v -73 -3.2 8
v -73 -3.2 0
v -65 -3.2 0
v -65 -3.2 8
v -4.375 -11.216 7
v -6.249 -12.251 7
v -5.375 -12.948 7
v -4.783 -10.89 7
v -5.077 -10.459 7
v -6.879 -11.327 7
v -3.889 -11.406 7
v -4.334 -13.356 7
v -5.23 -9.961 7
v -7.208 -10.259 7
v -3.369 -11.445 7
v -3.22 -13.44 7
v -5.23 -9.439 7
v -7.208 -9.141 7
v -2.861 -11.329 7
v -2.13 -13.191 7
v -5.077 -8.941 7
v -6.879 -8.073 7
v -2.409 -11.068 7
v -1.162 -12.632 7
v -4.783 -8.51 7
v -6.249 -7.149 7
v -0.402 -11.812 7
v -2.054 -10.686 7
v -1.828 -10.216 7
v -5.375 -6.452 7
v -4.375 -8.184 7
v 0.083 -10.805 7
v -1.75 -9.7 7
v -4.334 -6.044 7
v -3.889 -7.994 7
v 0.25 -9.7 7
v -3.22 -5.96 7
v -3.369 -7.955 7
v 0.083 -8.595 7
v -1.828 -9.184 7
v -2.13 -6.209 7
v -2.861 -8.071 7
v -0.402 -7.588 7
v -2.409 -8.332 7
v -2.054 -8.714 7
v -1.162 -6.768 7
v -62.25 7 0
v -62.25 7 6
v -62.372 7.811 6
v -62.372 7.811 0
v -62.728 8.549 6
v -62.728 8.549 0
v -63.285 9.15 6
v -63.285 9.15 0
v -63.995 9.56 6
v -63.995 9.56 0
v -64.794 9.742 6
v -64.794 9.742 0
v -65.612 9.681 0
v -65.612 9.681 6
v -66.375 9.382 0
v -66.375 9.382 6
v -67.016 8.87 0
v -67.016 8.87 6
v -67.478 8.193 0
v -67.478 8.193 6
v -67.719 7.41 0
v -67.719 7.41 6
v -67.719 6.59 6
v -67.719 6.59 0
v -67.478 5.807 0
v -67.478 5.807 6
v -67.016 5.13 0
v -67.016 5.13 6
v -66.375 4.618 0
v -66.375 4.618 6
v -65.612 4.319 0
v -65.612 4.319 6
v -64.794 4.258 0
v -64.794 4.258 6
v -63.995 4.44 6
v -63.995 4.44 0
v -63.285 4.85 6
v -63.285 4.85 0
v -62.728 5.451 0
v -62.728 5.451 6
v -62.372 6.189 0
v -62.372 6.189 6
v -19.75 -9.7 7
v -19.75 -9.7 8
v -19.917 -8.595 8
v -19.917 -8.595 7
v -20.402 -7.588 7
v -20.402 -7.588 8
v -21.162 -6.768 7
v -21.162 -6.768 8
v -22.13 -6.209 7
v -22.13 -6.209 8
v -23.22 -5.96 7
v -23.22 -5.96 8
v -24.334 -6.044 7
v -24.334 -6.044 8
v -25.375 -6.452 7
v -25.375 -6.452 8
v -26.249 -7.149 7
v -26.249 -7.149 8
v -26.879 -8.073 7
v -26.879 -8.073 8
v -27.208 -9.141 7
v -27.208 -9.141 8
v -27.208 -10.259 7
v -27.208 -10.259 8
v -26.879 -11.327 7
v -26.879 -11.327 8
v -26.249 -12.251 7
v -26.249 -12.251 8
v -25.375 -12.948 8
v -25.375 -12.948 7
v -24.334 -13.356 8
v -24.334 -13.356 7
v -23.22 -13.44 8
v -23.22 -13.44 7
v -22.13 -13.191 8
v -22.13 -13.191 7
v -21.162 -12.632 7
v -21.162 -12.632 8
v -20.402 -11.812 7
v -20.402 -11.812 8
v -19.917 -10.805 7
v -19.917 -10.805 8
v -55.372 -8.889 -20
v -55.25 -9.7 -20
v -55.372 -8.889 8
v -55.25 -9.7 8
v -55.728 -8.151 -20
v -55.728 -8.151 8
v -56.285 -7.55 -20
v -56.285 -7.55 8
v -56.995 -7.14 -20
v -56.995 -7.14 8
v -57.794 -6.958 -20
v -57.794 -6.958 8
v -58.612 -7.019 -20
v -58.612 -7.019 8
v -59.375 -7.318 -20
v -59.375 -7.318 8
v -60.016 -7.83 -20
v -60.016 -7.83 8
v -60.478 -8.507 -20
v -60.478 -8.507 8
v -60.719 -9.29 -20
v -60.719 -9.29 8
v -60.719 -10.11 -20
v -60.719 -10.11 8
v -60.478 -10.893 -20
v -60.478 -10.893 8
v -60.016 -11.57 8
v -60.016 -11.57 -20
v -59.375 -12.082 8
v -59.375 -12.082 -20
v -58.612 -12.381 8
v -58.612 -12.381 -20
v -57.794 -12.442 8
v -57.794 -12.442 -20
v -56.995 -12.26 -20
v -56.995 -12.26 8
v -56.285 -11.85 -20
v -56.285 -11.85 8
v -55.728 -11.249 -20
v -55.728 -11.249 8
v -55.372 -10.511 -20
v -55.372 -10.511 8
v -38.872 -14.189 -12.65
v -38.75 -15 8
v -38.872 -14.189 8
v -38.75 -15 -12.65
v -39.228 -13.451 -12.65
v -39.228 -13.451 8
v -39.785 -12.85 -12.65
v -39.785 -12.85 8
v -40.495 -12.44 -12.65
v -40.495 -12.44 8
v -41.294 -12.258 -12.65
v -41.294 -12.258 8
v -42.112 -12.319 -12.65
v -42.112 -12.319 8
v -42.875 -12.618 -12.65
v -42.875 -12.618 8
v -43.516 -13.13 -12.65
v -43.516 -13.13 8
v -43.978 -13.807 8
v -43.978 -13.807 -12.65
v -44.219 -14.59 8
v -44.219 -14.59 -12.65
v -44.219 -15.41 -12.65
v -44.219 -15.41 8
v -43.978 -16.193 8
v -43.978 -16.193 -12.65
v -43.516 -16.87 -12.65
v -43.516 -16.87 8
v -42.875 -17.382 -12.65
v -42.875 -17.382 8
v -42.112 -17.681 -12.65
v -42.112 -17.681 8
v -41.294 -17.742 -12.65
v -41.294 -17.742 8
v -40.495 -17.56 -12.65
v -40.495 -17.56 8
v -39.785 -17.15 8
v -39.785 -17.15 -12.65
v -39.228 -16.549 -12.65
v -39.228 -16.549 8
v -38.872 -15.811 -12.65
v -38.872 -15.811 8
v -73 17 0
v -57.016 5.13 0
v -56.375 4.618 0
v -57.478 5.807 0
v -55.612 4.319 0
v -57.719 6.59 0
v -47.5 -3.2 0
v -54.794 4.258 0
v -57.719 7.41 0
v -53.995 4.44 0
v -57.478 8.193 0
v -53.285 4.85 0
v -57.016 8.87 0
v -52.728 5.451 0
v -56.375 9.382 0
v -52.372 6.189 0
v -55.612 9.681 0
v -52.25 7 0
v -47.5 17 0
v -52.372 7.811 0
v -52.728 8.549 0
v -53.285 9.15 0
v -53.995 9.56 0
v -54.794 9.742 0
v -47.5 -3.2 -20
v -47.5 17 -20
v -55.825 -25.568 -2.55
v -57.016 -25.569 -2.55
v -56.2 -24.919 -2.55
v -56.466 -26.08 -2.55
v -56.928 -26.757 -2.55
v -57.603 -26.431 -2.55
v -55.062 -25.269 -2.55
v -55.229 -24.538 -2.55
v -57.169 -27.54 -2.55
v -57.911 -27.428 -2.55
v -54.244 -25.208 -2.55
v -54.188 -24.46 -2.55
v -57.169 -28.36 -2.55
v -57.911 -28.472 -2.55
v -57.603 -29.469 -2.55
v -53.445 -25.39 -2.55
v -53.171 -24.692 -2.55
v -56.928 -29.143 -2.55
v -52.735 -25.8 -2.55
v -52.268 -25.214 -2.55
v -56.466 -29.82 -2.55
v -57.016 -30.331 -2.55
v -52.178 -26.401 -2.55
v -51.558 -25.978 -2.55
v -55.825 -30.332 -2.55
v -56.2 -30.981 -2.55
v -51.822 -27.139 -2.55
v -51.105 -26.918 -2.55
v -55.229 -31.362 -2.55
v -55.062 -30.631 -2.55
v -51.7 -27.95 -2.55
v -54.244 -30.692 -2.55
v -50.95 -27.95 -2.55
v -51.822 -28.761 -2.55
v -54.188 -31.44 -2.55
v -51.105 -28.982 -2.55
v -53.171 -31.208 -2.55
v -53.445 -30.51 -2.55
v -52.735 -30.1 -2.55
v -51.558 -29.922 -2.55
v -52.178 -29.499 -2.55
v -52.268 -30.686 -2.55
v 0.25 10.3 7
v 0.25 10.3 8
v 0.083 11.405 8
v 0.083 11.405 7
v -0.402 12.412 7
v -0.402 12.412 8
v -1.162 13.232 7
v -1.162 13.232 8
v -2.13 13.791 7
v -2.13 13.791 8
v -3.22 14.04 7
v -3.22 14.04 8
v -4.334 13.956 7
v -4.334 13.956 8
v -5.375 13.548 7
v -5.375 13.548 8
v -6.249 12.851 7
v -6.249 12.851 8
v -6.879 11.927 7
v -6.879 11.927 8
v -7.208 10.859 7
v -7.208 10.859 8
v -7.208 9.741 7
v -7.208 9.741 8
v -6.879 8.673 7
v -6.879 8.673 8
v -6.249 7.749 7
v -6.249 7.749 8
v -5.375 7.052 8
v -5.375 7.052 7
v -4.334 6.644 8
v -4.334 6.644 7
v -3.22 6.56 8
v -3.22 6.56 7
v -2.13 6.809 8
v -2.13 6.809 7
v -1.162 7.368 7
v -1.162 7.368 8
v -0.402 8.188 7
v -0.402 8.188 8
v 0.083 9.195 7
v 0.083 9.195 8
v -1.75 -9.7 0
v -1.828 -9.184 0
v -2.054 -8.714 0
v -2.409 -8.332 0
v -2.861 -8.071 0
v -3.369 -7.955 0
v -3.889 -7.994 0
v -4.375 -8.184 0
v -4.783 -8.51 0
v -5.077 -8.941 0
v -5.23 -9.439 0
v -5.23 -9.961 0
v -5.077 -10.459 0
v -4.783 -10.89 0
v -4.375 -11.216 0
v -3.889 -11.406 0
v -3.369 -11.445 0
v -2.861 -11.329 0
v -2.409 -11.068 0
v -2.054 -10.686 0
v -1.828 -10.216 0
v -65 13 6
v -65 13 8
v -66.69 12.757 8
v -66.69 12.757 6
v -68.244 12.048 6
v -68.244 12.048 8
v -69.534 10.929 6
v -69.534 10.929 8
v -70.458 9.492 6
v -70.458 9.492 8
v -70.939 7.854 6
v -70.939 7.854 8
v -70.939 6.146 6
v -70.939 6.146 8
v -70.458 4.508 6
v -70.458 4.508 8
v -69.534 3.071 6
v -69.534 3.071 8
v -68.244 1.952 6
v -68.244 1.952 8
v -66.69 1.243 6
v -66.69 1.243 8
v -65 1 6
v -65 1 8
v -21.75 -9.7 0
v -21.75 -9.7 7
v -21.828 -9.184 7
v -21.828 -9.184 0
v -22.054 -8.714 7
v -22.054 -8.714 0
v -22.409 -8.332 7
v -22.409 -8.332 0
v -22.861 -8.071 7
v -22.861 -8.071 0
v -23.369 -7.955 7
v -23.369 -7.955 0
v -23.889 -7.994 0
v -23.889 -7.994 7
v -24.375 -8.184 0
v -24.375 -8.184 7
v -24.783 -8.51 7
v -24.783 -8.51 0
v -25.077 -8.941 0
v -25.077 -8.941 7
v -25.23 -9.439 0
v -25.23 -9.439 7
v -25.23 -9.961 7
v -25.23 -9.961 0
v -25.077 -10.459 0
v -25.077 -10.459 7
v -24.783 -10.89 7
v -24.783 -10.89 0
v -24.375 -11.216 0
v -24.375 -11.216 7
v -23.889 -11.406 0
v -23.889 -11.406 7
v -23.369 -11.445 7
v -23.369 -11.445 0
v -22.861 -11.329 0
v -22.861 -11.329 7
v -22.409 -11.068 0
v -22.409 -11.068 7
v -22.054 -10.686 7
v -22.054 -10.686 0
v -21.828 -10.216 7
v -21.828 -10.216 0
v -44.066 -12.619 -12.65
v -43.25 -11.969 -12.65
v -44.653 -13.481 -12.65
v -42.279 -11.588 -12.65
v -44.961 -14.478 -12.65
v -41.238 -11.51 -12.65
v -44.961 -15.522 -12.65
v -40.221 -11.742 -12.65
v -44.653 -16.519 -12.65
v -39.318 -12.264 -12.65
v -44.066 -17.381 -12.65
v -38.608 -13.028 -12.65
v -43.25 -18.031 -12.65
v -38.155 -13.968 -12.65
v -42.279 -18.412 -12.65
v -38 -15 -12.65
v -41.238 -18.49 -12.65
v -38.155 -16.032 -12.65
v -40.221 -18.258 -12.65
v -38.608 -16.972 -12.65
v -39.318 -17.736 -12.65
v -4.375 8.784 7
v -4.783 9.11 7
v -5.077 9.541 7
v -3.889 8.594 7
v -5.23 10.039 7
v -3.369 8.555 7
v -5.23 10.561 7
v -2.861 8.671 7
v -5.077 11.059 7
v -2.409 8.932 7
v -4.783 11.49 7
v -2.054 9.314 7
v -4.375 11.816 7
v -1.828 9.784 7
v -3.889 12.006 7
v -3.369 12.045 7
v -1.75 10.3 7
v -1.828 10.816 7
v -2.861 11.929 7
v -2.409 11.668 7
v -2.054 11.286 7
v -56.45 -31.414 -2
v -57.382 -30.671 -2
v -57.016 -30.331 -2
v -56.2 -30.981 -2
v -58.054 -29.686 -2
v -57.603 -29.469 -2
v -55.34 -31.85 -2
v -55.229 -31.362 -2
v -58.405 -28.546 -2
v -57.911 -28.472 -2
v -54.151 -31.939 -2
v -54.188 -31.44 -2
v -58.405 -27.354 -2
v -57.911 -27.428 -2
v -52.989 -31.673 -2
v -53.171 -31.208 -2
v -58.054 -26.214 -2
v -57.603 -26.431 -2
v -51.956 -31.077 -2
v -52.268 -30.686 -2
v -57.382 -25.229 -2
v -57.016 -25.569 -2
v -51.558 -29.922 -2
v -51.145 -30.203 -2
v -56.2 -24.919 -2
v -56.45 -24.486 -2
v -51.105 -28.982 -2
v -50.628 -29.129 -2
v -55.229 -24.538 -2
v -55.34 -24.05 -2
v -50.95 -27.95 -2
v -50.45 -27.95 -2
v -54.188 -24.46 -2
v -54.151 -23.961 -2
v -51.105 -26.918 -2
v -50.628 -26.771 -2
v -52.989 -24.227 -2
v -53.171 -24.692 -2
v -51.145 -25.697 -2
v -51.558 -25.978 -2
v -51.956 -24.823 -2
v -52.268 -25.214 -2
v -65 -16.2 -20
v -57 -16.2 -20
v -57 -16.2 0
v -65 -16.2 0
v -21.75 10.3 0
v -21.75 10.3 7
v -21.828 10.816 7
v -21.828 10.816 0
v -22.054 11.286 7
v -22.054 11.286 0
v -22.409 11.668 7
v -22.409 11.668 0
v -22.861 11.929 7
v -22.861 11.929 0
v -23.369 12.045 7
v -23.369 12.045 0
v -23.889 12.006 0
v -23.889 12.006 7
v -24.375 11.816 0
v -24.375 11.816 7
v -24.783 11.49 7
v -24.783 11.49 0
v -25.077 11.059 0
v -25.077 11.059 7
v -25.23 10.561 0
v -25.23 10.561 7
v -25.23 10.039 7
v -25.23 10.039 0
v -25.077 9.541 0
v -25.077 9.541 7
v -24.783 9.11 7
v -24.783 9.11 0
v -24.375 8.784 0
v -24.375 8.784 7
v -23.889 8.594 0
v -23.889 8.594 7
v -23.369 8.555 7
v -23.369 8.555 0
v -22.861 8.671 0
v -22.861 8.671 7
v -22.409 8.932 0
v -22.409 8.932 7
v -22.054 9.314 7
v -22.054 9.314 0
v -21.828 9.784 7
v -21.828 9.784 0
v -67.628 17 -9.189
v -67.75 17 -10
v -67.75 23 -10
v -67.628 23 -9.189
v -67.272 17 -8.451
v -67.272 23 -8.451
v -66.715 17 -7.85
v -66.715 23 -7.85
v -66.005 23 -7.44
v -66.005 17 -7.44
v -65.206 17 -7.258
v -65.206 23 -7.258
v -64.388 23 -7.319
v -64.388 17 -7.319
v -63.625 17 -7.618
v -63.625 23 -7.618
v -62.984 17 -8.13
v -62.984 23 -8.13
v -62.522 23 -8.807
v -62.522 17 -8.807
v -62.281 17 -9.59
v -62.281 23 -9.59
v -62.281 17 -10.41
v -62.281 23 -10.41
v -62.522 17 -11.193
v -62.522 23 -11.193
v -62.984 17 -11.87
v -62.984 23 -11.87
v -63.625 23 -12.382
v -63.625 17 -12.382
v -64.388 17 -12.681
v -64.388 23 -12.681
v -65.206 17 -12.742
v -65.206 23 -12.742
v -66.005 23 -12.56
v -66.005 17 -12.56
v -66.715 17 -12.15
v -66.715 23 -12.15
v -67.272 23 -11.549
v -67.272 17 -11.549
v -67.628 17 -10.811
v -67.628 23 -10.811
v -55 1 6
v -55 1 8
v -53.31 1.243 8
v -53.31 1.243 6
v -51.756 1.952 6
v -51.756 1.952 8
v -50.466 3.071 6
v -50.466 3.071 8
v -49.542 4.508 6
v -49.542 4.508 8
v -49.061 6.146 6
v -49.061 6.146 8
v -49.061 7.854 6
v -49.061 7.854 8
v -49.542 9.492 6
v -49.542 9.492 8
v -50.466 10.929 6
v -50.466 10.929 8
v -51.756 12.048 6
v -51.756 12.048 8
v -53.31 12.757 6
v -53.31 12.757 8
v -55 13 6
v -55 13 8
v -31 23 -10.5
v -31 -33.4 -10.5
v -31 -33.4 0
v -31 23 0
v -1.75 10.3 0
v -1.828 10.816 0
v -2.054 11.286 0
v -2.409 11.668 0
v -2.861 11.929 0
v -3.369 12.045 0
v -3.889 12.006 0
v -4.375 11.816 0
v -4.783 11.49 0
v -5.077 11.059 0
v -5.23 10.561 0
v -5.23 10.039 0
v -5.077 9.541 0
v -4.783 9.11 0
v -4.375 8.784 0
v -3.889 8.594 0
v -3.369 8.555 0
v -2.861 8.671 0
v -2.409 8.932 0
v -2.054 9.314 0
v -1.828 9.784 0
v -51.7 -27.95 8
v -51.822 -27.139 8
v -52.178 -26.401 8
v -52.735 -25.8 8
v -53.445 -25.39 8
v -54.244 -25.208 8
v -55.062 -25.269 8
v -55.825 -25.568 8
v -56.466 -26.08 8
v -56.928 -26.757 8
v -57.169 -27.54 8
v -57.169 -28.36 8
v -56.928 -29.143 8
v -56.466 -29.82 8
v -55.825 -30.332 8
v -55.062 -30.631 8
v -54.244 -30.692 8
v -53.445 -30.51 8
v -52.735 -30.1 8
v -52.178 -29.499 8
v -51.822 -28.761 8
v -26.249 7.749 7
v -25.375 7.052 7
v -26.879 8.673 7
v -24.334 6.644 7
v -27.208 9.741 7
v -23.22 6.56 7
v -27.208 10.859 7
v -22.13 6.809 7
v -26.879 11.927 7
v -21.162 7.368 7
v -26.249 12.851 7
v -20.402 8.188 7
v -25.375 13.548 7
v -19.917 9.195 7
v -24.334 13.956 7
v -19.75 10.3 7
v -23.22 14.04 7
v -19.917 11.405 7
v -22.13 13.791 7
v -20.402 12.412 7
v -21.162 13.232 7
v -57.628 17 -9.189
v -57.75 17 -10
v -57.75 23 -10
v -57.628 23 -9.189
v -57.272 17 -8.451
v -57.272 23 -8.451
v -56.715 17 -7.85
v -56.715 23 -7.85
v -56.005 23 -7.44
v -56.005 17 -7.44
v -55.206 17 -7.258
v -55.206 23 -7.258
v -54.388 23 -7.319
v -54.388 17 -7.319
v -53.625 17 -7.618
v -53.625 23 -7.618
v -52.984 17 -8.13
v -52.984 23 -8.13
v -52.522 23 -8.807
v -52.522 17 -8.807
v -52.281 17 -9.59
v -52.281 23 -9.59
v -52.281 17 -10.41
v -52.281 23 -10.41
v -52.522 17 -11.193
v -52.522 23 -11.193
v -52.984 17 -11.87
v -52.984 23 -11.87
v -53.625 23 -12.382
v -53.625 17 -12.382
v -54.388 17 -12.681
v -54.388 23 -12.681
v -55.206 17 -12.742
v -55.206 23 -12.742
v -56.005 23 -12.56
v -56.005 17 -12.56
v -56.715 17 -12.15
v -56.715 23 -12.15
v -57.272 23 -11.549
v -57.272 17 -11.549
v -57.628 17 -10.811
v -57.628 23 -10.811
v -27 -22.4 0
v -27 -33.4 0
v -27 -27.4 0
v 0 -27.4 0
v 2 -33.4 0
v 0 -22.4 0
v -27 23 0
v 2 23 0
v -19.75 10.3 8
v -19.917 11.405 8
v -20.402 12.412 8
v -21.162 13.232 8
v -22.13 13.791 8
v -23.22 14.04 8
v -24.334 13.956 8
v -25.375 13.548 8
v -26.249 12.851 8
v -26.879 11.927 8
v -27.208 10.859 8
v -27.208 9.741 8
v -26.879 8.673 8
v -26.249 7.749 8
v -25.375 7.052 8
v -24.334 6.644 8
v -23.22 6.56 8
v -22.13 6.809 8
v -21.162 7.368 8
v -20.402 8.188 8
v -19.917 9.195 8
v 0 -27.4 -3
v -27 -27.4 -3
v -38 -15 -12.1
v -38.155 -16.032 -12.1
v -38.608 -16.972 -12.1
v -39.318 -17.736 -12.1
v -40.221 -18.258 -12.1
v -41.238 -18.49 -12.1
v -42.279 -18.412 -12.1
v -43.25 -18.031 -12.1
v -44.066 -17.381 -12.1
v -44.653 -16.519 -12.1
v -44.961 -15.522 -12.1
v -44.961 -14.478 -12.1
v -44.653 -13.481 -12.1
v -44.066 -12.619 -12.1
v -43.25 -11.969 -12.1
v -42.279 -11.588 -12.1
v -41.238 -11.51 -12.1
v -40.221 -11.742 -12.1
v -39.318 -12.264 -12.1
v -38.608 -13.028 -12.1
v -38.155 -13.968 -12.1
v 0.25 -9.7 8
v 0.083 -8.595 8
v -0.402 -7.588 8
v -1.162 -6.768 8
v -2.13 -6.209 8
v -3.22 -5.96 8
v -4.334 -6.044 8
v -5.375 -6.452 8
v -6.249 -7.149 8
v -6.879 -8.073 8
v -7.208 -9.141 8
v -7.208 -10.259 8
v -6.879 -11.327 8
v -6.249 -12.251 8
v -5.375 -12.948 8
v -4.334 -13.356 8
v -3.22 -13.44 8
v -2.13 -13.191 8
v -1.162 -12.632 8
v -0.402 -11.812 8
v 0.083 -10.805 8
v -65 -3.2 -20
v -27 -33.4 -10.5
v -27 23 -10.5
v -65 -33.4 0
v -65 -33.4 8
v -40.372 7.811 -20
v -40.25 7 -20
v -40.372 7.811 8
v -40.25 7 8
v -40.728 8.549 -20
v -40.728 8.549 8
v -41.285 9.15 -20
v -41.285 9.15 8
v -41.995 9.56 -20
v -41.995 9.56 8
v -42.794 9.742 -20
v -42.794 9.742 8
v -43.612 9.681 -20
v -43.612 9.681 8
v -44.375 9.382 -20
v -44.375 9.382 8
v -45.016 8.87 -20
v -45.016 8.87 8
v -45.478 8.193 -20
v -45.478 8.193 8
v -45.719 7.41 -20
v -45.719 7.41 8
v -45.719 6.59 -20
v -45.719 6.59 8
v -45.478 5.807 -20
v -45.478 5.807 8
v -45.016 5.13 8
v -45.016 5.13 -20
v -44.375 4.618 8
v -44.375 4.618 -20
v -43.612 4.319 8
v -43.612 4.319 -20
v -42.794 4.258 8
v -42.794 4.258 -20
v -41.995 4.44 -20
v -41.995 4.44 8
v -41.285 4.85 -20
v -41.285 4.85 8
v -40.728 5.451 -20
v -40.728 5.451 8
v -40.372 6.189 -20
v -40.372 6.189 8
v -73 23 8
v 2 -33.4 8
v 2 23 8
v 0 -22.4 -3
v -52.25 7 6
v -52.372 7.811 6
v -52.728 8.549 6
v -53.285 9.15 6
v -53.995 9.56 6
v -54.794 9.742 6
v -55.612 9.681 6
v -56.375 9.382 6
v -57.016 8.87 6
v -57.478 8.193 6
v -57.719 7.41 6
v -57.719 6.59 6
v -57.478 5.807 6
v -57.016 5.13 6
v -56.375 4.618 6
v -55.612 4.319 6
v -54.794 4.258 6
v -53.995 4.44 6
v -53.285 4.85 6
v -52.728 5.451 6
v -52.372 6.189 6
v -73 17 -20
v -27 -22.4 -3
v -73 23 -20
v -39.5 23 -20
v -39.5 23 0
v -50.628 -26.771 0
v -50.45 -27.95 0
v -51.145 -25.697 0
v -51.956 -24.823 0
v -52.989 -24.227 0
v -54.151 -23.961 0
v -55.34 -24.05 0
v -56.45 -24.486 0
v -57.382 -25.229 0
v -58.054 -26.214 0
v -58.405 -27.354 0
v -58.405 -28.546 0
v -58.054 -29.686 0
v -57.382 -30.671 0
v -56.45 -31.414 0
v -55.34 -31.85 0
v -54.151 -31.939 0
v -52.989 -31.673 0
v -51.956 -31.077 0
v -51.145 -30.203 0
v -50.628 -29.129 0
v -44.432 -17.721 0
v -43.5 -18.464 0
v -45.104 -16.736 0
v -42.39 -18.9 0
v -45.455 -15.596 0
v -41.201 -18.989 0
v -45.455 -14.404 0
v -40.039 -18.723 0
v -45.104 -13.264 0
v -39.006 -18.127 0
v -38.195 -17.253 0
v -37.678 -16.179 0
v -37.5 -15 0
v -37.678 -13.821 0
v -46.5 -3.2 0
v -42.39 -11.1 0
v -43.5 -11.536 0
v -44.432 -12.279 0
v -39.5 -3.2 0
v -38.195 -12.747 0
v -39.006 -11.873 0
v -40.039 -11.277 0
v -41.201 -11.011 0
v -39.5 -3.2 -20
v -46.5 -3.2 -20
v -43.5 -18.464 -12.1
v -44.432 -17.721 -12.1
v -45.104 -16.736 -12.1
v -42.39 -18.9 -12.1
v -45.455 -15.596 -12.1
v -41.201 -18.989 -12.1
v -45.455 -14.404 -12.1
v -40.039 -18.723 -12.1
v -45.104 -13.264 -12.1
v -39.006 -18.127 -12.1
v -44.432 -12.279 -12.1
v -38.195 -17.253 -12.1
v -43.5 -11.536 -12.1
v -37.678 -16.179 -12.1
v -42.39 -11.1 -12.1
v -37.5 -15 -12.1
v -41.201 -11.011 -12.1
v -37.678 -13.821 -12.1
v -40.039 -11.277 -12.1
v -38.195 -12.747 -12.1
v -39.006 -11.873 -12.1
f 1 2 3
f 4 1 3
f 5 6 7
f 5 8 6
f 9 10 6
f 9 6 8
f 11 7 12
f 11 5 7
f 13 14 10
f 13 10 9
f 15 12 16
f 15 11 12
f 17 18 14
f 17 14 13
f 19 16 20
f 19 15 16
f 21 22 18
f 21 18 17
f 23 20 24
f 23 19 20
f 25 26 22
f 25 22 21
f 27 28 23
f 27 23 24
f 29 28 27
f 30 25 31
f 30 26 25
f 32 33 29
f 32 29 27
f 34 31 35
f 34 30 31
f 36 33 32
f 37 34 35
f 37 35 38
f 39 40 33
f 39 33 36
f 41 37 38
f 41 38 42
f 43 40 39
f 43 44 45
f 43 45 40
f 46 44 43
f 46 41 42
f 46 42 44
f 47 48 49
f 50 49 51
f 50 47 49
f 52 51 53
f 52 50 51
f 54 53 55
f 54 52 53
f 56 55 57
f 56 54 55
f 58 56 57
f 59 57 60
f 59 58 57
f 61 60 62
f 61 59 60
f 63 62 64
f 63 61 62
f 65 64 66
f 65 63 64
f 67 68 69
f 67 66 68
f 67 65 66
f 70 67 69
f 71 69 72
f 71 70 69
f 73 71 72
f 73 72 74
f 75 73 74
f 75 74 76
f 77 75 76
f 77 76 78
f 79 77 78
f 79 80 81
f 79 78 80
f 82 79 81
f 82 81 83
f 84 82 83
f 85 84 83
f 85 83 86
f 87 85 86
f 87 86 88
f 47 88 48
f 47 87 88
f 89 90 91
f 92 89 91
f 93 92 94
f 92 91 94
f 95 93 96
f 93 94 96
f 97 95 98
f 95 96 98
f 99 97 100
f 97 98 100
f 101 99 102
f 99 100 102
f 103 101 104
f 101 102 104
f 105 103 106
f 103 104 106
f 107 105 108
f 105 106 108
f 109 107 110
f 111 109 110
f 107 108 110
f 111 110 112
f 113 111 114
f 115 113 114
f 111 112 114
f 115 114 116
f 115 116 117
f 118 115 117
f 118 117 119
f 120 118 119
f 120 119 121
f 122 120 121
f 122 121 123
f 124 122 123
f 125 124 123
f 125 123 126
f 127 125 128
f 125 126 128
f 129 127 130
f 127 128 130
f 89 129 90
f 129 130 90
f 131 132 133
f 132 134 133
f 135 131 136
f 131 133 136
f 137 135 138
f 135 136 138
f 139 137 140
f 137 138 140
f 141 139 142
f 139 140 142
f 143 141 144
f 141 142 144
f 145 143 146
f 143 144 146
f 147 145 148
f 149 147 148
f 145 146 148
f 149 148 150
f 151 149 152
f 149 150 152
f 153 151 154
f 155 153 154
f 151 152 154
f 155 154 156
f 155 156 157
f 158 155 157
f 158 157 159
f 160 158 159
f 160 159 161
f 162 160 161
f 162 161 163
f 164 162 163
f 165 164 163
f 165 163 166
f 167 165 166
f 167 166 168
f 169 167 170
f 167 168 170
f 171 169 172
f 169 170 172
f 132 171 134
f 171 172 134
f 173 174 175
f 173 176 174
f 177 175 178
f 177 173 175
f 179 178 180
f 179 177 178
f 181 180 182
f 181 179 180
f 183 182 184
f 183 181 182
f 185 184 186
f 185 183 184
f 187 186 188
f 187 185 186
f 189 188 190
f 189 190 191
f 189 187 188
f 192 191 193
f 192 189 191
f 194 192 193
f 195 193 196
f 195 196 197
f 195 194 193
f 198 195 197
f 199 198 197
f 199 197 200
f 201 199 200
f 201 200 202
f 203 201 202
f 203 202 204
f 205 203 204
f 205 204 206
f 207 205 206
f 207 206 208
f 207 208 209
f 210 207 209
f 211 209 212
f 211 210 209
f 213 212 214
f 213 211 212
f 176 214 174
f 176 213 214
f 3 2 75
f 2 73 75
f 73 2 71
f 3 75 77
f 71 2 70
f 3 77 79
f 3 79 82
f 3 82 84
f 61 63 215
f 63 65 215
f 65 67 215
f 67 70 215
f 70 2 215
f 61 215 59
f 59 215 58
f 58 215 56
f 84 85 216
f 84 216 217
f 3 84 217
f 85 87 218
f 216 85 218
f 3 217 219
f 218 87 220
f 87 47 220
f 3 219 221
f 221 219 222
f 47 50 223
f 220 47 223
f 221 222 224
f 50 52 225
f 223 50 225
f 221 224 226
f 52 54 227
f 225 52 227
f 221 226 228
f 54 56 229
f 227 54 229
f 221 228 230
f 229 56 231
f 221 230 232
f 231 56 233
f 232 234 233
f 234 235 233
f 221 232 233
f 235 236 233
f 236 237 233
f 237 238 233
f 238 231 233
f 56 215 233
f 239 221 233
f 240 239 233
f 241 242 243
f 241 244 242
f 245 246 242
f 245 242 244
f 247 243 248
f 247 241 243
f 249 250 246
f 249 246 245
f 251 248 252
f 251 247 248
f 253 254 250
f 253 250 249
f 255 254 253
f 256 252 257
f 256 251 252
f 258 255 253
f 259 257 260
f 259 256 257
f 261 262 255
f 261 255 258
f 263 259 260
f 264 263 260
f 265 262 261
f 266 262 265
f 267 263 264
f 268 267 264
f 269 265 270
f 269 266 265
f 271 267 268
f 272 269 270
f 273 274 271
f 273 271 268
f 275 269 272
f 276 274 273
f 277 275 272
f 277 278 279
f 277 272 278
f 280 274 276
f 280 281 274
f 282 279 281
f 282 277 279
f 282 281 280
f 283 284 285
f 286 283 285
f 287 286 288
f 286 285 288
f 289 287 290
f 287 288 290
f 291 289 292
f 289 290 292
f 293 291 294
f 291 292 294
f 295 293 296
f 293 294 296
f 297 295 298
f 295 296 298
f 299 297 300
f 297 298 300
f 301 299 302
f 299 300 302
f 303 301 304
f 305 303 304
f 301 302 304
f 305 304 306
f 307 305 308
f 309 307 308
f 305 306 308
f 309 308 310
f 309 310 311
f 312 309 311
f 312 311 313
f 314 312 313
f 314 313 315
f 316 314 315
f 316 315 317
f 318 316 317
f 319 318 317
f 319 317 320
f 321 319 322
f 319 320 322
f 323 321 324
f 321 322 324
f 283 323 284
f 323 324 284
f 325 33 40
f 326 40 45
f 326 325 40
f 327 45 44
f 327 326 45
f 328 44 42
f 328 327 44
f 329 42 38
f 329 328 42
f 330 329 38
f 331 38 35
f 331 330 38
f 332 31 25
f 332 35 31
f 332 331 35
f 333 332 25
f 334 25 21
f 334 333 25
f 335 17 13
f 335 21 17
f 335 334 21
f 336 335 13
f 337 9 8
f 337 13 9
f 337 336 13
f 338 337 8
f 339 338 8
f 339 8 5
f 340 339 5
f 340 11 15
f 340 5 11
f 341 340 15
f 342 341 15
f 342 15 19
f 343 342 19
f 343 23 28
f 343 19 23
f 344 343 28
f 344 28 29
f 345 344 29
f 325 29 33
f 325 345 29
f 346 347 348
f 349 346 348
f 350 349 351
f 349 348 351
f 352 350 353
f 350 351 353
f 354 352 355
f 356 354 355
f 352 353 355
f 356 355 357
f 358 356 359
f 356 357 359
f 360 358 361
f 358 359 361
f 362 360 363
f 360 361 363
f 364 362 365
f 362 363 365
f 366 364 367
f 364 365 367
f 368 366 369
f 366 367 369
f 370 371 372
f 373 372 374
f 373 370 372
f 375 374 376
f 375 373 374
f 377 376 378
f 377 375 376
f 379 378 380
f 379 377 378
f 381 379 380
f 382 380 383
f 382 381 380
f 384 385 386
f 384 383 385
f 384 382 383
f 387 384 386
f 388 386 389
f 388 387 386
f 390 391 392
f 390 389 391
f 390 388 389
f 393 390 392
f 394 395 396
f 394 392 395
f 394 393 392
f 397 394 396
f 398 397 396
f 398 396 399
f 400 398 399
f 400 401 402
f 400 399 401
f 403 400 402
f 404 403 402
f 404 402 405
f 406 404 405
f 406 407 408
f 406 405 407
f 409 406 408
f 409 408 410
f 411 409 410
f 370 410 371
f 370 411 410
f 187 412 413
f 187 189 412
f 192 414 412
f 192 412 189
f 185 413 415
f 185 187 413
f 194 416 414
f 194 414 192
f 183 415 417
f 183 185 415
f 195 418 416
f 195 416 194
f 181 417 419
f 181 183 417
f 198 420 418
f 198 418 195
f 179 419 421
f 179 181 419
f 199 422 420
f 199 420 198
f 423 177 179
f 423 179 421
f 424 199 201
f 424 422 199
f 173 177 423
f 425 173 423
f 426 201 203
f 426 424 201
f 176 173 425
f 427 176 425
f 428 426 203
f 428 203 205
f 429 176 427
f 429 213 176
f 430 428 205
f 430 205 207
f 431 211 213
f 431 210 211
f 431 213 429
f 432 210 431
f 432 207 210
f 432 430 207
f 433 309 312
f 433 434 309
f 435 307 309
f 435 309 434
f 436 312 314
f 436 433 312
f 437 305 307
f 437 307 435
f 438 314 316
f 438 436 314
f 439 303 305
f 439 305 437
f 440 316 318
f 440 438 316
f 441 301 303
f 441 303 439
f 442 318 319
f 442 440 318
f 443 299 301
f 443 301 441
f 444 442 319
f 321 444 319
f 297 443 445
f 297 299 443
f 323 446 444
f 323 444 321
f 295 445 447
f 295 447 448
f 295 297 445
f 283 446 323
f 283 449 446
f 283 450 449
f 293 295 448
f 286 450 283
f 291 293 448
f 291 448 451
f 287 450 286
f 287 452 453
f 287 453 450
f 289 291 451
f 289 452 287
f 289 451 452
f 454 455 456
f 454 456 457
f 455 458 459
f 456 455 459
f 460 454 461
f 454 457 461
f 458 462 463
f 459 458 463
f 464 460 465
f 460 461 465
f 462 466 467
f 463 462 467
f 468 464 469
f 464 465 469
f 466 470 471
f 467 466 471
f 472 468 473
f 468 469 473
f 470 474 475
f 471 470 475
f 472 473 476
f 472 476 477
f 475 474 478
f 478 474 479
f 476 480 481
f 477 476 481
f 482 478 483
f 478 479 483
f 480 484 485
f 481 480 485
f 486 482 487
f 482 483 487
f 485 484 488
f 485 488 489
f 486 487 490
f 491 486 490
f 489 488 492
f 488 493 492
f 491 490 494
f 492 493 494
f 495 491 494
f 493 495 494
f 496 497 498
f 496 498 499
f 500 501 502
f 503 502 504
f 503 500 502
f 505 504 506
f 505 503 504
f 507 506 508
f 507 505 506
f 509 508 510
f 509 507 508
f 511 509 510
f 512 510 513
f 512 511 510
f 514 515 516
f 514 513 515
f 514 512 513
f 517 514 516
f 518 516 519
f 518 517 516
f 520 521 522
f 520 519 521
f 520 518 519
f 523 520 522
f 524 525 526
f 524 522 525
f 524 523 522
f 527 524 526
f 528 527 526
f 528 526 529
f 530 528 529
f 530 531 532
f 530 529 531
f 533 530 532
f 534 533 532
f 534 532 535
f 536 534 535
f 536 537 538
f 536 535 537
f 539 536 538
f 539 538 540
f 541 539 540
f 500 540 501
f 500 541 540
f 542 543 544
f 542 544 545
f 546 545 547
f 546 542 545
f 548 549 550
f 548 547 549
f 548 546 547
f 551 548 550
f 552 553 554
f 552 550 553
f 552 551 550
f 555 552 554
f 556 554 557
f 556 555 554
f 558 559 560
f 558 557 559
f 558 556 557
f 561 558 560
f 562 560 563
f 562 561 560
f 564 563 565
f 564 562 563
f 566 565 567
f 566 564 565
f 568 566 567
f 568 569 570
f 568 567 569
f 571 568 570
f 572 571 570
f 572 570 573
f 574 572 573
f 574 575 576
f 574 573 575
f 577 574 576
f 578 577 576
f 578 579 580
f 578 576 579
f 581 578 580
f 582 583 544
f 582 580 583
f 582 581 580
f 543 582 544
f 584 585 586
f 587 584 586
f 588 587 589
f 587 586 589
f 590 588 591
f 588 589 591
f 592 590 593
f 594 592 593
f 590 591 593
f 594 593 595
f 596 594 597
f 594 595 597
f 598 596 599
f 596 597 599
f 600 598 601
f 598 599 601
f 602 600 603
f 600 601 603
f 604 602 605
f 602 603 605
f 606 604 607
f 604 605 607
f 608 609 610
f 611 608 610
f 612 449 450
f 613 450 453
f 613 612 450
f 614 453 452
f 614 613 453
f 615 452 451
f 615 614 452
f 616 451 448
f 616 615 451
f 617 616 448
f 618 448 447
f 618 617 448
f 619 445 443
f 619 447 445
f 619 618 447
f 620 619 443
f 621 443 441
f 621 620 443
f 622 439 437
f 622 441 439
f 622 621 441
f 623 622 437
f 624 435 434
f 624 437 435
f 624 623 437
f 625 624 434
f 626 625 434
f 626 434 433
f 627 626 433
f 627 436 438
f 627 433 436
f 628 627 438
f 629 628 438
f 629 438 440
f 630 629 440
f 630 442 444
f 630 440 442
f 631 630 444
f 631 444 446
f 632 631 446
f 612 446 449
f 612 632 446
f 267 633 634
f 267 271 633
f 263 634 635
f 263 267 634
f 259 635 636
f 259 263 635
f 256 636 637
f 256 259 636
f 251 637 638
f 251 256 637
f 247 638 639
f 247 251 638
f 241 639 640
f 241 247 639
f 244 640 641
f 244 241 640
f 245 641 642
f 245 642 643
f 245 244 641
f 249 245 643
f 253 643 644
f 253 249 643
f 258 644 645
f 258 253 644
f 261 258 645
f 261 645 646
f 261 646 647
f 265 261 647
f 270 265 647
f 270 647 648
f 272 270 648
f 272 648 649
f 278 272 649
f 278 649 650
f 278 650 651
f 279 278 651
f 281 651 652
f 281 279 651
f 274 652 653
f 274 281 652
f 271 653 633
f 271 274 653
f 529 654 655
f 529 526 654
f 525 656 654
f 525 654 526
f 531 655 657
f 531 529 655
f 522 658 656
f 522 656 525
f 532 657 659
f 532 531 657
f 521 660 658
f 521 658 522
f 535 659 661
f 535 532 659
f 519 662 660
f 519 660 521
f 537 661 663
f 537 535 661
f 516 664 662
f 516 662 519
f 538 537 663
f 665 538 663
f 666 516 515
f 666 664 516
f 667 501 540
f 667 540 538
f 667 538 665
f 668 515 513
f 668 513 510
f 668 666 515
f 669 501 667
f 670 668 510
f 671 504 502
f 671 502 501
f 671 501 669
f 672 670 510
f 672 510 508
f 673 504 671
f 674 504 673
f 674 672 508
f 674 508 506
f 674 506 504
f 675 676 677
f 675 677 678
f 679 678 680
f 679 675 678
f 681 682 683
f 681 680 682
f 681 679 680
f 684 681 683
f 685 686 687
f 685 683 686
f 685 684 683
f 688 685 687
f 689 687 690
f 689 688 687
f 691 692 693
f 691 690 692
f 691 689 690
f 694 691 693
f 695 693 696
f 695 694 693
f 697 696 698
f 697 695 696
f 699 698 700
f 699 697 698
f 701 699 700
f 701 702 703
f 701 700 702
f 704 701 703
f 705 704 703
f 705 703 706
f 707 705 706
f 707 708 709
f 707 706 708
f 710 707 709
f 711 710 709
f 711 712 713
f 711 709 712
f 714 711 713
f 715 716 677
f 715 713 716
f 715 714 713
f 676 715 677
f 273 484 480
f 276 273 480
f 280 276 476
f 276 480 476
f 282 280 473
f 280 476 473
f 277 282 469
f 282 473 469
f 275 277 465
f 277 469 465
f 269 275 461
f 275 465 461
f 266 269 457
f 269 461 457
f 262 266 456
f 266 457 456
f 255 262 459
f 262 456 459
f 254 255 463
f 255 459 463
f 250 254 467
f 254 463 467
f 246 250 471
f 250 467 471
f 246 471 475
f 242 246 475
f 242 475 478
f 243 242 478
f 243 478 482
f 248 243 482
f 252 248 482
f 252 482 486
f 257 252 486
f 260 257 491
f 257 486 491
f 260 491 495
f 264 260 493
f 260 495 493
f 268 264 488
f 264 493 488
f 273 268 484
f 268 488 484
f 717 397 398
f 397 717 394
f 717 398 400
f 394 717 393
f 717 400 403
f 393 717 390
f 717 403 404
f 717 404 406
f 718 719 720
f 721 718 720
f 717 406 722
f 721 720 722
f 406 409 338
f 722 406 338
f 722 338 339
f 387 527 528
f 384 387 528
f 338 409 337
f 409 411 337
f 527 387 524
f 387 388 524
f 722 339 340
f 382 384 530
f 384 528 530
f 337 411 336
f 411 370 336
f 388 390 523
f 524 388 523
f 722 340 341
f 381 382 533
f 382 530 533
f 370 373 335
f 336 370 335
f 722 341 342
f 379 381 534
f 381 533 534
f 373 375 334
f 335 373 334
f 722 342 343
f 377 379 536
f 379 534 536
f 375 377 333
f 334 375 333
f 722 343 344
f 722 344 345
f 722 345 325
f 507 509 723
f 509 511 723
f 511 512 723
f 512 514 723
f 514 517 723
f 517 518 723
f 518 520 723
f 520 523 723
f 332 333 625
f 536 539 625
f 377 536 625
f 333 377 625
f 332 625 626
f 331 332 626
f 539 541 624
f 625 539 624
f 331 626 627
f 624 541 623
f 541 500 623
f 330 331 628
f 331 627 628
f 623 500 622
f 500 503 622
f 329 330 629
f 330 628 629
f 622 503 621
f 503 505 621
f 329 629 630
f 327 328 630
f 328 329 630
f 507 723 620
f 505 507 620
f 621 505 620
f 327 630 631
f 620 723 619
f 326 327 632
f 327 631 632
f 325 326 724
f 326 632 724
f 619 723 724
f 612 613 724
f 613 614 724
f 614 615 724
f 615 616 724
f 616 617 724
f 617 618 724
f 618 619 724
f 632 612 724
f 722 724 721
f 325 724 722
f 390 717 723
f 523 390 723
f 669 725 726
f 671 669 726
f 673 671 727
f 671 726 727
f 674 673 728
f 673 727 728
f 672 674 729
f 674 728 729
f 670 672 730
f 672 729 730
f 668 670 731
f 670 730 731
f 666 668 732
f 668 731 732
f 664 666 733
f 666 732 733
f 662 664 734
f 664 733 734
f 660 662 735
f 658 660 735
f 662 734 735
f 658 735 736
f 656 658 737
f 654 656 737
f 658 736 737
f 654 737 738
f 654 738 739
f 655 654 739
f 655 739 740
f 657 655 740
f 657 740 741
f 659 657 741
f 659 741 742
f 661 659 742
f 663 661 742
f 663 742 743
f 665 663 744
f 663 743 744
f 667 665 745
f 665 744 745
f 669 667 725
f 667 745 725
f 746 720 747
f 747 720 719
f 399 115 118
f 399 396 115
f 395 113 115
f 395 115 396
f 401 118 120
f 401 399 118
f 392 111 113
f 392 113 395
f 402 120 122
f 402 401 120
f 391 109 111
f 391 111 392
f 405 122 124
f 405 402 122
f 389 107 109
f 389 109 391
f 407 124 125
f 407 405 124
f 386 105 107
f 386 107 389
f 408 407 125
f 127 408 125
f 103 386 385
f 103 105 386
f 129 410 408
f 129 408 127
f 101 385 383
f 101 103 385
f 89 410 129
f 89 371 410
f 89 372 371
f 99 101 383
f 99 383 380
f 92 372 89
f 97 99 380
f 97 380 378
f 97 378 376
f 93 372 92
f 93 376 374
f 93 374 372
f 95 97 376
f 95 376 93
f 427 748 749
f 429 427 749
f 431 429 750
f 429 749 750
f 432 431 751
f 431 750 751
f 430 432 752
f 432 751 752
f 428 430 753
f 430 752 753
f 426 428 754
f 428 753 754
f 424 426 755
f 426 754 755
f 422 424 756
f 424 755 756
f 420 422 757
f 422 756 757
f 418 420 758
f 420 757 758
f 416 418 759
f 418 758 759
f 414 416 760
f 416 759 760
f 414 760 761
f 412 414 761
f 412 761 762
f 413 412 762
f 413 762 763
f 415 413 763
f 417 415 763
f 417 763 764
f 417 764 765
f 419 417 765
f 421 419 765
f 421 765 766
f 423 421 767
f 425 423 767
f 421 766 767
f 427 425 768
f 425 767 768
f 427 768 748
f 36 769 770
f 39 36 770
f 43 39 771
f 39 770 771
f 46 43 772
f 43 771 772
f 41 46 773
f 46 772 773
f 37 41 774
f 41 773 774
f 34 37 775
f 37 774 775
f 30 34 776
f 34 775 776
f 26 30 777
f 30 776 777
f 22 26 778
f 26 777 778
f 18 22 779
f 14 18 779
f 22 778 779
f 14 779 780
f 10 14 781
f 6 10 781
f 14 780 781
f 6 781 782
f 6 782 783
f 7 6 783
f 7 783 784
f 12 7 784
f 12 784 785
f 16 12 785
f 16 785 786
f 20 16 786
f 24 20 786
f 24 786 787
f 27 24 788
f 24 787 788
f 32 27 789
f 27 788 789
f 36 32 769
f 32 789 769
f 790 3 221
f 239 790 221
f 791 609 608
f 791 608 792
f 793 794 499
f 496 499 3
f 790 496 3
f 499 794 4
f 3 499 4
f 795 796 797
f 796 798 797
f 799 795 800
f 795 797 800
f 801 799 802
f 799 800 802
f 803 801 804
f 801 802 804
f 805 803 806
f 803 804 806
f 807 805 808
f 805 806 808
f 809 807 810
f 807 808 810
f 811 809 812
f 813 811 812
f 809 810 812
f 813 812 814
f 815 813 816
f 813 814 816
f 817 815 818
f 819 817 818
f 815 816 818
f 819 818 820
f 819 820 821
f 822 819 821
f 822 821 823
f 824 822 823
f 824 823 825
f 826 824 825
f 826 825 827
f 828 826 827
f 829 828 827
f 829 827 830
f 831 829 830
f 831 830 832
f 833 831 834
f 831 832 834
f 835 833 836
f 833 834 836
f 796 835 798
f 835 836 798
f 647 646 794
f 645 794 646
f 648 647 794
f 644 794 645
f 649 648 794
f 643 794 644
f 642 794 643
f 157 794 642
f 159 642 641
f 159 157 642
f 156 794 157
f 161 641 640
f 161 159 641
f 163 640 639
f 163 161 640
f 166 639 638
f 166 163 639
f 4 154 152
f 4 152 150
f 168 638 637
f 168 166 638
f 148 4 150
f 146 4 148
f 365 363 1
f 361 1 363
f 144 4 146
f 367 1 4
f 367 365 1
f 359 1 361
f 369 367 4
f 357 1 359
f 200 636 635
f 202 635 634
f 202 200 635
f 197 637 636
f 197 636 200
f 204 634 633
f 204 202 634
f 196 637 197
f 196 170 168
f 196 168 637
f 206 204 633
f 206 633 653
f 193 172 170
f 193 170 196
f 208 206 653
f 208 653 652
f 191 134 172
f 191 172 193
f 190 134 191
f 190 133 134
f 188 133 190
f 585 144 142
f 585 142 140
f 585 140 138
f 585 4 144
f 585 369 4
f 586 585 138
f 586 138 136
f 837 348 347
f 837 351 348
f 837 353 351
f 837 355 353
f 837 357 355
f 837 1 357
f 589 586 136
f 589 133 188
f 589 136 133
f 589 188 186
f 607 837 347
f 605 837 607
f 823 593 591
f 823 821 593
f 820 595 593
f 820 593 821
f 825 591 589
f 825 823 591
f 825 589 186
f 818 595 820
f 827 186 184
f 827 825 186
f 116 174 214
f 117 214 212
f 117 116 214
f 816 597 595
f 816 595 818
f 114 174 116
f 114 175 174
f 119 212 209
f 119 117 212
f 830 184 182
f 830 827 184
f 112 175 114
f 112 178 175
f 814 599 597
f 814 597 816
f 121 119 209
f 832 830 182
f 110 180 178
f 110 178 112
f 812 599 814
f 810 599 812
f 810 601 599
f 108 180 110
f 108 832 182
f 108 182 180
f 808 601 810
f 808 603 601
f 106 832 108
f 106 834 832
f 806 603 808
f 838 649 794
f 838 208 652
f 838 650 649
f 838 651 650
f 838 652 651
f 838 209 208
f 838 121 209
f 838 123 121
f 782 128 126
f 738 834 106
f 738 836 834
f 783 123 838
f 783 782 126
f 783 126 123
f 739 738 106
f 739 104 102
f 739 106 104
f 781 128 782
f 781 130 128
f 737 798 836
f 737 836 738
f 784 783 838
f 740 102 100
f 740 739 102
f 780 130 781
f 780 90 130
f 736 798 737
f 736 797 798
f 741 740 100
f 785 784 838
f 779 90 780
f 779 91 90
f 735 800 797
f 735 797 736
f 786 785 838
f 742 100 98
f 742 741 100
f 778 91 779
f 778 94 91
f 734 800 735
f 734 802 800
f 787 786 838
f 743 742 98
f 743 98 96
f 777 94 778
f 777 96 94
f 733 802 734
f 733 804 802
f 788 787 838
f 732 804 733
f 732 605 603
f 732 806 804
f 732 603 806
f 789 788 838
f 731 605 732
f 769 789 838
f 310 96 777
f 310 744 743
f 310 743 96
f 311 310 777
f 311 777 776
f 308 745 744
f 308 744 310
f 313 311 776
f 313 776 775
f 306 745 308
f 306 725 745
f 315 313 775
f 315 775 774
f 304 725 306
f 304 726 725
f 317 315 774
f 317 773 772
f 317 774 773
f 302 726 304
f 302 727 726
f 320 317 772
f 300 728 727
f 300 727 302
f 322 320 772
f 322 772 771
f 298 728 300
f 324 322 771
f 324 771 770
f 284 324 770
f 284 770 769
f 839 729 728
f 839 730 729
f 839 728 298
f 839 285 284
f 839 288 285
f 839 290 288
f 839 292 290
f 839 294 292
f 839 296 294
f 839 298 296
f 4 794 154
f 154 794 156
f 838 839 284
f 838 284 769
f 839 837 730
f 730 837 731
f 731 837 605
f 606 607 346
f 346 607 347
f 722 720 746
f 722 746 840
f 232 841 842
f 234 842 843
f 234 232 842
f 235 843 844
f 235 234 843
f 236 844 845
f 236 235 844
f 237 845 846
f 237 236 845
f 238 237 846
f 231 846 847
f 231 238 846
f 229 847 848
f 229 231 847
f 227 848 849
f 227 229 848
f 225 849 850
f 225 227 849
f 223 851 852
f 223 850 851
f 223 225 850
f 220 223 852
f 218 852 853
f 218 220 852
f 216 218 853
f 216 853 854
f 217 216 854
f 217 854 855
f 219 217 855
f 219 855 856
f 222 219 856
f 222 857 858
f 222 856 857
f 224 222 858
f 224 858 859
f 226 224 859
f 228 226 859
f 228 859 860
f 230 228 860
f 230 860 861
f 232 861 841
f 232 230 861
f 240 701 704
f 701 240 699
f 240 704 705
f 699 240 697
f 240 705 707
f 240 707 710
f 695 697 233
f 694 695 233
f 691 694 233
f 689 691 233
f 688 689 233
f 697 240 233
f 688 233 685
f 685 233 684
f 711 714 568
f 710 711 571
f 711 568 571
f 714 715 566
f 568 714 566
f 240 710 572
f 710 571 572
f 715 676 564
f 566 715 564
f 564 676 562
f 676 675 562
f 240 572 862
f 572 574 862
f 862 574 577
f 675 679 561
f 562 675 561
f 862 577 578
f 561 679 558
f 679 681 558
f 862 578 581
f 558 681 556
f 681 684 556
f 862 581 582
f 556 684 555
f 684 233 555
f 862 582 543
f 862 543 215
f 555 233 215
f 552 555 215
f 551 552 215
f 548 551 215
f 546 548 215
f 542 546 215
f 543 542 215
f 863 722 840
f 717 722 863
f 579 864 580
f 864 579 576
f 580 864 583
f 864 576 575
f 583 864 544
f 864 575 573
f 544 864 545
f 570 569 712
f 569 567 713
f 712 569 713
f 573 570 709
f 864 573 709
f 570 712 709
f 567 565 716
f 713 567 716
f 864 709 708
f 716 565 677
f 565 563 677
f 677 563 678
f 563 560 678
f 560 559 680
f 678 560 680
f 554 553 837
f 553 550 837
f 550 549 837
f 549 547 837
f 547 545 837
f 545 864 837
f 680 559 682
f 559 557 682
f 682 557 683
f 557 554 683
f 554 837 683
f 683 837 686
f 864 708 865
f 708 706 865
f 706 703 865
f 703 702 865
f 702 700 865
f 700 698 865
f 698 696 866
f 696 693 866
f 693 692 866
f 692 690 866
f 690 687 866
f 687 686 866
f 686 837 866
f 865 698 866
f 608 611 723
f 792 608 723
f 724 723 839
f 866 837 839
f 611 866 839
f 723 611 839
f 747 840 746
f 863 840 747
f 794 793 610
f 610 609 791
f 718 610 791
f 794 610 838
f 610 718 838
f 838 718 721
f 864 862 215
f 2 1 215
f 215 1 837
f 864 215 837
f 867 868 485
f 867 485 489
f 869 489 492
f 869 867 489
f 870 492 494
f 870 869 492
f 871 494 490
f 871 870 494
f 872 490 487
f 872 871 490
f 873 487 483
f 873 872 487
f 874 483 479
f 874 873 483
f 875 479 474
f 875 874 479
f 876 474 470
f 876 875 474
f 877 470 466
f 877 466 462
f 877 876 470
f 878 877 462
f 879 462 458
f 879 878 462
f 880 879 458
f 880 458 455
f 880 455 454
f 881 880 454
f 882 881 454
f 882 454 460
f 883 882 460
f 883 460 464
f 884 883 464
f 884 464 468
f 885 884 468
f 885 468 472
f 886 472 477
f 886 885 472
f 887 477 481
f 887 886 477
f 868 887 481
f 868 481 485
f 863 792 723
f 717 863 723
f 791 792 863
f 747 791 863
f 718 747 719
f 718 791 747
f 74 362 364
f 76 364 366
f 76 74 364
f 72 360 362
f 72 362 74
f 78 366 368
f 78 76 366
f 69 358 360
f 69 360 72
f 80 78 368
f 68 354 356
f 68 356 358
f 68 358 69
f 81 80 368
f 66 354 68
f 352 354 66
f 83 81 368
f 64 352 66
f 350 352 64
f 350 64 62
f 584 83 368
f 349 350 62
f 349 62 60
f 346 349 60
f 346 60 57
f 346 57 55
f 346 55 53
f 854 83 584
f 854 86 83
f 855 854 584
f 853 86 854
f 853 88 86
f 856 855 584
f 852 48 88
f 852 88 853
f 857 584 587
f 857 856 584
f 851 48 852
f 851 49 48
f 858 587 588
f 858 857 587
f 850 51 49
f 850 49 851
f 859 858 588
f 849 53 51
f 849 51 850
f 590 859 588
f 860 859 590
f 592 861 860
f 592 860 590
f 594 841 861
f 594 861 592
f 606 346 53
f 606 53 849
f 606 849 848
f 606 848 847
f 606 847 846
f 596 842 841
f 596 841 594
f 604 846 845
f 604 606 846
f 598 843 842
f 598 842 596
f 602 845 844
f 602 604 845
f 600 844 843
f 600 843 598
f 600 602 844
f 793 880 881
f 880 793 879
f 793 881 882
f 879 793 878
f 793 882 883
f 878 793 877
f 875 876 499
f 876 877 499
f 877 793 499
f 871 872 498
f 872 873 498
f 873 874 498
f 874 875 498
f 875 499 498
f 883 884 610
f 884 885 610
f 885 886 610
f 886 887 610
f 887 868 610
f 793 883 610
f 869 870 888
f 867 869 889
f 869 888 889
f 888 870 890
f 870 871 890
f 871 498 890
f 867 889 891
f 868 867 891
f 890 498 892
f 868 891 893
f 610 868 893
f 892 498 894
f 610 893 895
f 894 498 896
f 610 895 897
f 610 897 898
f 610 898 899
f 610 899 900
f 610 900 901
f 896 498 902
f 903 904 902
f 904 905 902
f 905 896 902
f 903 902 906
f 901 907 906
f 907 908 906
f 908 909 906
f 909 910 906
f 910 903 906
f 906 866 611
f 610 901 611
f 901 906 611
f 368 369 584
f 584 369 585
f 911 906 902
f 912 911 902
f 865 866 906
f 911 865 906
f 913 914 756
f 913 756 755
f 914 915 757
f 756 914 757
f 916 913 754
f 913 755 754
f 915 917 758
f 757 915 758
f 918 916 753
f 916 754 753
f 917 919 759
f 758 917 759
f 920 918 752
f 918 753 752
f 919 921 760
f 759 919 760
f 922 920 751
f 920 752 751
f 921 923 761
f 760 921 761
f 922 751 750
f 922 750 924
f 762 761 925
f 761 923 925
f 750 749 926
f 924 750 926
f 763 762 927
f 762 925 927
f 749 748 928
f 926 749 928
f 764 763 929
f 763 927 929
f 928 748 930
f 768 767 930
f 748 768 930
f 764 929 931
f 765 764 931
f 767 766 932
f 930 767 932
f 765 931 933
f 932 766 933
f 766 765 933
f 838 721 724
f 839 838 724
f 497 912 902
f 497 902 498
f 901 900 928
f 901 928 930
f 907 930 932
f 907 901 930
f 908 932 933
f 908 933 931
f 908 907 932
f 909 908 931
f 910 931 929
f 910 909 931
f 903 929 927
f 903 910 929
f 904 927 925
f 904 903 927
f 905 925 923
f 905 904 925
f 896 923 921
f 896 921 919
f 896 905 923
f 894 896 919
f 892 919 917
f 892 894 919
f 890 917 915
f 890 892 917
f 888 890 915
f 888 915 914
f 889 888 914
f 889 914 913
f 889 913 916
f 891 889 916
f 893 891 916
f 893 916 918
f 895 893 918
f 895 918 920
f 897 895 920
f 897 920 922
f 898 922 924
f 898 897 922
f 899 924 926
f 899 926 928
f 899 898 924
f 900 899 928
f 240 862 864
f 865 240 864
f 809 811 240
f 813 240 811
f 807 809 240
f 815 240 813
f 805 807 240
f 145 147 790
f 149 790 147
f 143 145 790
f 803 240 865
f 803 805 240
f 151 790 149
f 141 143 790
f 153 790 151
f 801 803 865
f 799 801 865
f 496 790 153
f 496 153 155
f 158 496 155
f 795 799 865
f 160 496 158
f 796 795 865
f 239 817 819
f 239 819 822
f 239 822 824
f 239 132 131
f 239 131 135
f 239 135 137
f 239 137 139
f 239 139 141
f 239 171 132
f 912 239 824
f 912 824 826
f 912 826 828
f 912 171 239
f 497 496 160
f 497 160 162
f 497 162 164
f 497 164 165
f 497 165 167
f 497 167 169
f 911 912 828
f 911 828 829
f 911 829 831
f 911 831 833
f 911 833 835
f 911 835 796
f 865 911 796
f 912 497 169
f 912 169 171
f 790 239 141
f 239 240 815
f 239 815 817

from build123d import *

# Parameters (mm, degrees)
SKETCH_R             = 1.75
SKETCH_R_2           = 2.75
PAD_DEPTH            = 8
PAD001_DEPTH         = 20
SKETCH004_R          = 2.75
POCKET_DEPTH         = 23.001
SKETCH005_R          = 2.75
POCKET001_DEPTH      = 20.001
POCKET001_DEPTH_BACK = 8.001
SKETCH008_R          = 4
SKETCH008_R_2        = 2.75
PAD005_DEPTH         = 2
SKETCH009_R          = 3.5
SKETCH009_R_2        = 2.75
PAD006_DEPTH         = 0.55
SKETCH010_R          = 4
SKETCH010_R_2        = 2.75
PAD007_DEPTH         = 12.1
SKETCH011_R          = 3.5
SKETCH011_R_2        = 2.75
PAD008_DEPTH         = 0.55
POCKET004_DEPTH      = 2
SKETCH020_W          = 4
SKETCH020_H          = 10.5
PAD013_DEPTH         = 33.4
PAD013_DEPTH_BACK    = 23
SKETCH021_W          = 27
SKETCH021_H          = 5
PAD014_DEPTH         = 3
SKETCH029_R          = 3.75
POCKET007_DEPTH      = 1


with BuildPart() as part:
    # Sketch → Pad (new body)
    with BuildSketch(Plane.XY):
        Polygon((0, 23), (-73, 23), (-73, -3.2), (-65, -3.2), (-65, -33.4), (0, -33.4), (2, -33.4), (2, 23), align=None)
        with Locations((-23.5, 10.3)):
            Circle(SKETCH_R, mode=Mode.SUBTRACT)
        with Locations((-3.5, 10.3)):
            Circle(SKETCH_R, mode=Mode.SUBTRACT)
        with Locations((-23.5, -9.7)):
            Circle(SKETCH_R, mode=Mode.SUBTRACT)
        with Locations((-3.5, -9.7)):
            Circle(SKETCH_R, mode=Mode.SUBTRACT)
        with Locations((-55, 7)):
            Circle(SKETCH_R_2, mode=Mode.SUBTRACT)
        with Locations((-41.5, -15)):
            Circle(SKETCH_R_2, mode=Mode.SUBTRACT)
        with Locations((-54.45, -27.95)):
            Circle(SKETCH_R_2, mode=Mode.SUBTRACT)
        with Locations((-65, 7)):
            Circle(SKETCH_R_2, mode=Mode.SUBTRACT)
    extrude(amount=PAD_DEPTH)

    # Sketch001 → Pad001 (join)
    with BuildSketch(Plane(origin=(0, 0, 0), x_dir=(1, 0, 0), z_dir=(0, 0, -1))):
        Polygon((-73, -23), (-39.5, -23), (-39.5, 3.2), (-46.5, 3.2), (-57, 16.2), (-65, 16.2), (-65, 3.2), (-47.5, 3.2), (-47.5, -17), (-73, -17), align=None)
    extrude(amount=PAD001_DEPTH)

    # Sketch004 → Pocket (cut, through all)
    with BuildSketch(Plane(origin=(0, 0, 0), x_dir=(-1, 0, 0), z_dir=(0, 1, 0))):
        with Locations((55, -10)):
            Circle(SKETCH004_R)
        with Locations((65, -10)):
            Circle(SKETCH004_R)
    extrude(amount=POCKET_DEPTH, mode=Mode.SUBTRACT)

    # Sketch005 → Pocket001 (cut, two sides)
    with BuildSketch(Plane.XY) as pocket001_sk:
        with Locations((-58, -9.7)):
            Circle(SKETCH005_R)
        with Locations((-43, 7)):
            Circle(SKETCH005_R)
    extrude(amount=-POCKET001_DEPTH, mode=Mode.SUBTRACT)
    extrude(pocket001_sk.sketch, amount=POCKET001_DEPTH_BACK, mode=Mode.SUBTRACT)

    # Sketch008 → Pad005 (join)
    with BuildSketch(Plane.XY):
        with Locations((-54.45, -27.95)):
            Circle(SKETCH008_R)
        with Locations((-54.45, -27.95)):
            Circle(SKETCH008_R_2, mode=Mode.SUBTRACT)
    extrude(amount=-PAD005_DEPTH)

    # Sketch009 (on Face30 of Pad005) → Pad006 (join)
    with BuildSketch(Plane(origin=(0, 0, -2), x_dir=(1, 0, 0), z_dir=(0, 0, -1))):
        with Locations((-54.45, 27.95)):
            Circle(SKETCH009_R)
        with Locations((-54.45, 27.95)):
            Circle(SKETCH009_R_2, mode=Mode.SUBTRACT)
    extrude(amount=PAD006_DEPTH)

    # Sketch010 → Pad007 (join)
    with BuildSketch(Plane.XY):
        with Locations((-41.5, -15)):
            Circle(SKETCH010_R)
        with Locations((-41.5, -15)):
            Circle(SKETCH010_R_2, mode=Mode.SUBTRACT)
    extrude(amount=-PAD007_DEPTH)

    # Sketch011 (on Face33 of Pad007) → Pad008 (join)
    with BuildSketch(Plane(origin=(0, 0, -12.1), x_dir=(1, 0, 0), z_dir=(0, 0, -1))):
        with Locations((-41.5, 15)):
            Circle(SKETCH011_R)
        with Locations((-41.5, 15)):
            Circle(SKETCH011_R_2, mode=Mode.SUBTRACT)
    extrude(amount=PAD008_DEPTH)

    # Sketch017 (on DatumPlane) → Pocket004 (cut)
    with BuildSketch(Plane.XY.offset(8)):
        with BuildLine():
            ThreePointArc((-65, 13), (-71, 7), (-65, 1))
            Line((-65, 1), (-55, 1))
            ThreePointArc((-55, 1), (-49, 7), (-55, 13))
            Line((-55, 13), (-65, 13))
        make_face()
    extrude(amount=-POCKET004_DEPTH, mode=Mode.SUBTRACT)

    # Sketch020 → Pad013 (join, two sides)
    with BuildSketch(Plane.XZ) as pad013_sk:
        with Locations((-29, -5.25)):
            Rectangle(SKETCH020_W, SKETCH020_H)
    extrude(amount=PAD013_DEPTH)
    extrude(pad013_sk.sketch, amount=-PAD013_DEPTH_BACK)

    # Sketch021 → Pad014 (join)
    with BuildSketch(Plane(origin=(0, 0, 0), x_dir=(-1, 0, 0), z_dir=(0, 0, -1))):
        with Locations((13.5, -24.9)):
            Rectangle(SKETCH021_W, SKETCH021_H)
    extrude(amount=PAD014_DEPTH)

    # Sketch029 (on DatumPlane) → Pocket007 (cut)
    with BuildSketch(Plane.XY.offset(8)):
        with Locations((-23.5, 10.3)):
            Circle(SKETCH029_R)
        with Locations((-3.5, 10.3)):
            Circle(SKETCH029_R)
        with Locations((-23.5, -9.7)):
            Circle(SKETCH029_R)
        with Locations((-3.5, -9.7)):
            Circle(SKETCH029_R)
    extrude(amount=-POCKET007_DEPTH, mode=Mode.SUBTRACT)


solid = part.part
